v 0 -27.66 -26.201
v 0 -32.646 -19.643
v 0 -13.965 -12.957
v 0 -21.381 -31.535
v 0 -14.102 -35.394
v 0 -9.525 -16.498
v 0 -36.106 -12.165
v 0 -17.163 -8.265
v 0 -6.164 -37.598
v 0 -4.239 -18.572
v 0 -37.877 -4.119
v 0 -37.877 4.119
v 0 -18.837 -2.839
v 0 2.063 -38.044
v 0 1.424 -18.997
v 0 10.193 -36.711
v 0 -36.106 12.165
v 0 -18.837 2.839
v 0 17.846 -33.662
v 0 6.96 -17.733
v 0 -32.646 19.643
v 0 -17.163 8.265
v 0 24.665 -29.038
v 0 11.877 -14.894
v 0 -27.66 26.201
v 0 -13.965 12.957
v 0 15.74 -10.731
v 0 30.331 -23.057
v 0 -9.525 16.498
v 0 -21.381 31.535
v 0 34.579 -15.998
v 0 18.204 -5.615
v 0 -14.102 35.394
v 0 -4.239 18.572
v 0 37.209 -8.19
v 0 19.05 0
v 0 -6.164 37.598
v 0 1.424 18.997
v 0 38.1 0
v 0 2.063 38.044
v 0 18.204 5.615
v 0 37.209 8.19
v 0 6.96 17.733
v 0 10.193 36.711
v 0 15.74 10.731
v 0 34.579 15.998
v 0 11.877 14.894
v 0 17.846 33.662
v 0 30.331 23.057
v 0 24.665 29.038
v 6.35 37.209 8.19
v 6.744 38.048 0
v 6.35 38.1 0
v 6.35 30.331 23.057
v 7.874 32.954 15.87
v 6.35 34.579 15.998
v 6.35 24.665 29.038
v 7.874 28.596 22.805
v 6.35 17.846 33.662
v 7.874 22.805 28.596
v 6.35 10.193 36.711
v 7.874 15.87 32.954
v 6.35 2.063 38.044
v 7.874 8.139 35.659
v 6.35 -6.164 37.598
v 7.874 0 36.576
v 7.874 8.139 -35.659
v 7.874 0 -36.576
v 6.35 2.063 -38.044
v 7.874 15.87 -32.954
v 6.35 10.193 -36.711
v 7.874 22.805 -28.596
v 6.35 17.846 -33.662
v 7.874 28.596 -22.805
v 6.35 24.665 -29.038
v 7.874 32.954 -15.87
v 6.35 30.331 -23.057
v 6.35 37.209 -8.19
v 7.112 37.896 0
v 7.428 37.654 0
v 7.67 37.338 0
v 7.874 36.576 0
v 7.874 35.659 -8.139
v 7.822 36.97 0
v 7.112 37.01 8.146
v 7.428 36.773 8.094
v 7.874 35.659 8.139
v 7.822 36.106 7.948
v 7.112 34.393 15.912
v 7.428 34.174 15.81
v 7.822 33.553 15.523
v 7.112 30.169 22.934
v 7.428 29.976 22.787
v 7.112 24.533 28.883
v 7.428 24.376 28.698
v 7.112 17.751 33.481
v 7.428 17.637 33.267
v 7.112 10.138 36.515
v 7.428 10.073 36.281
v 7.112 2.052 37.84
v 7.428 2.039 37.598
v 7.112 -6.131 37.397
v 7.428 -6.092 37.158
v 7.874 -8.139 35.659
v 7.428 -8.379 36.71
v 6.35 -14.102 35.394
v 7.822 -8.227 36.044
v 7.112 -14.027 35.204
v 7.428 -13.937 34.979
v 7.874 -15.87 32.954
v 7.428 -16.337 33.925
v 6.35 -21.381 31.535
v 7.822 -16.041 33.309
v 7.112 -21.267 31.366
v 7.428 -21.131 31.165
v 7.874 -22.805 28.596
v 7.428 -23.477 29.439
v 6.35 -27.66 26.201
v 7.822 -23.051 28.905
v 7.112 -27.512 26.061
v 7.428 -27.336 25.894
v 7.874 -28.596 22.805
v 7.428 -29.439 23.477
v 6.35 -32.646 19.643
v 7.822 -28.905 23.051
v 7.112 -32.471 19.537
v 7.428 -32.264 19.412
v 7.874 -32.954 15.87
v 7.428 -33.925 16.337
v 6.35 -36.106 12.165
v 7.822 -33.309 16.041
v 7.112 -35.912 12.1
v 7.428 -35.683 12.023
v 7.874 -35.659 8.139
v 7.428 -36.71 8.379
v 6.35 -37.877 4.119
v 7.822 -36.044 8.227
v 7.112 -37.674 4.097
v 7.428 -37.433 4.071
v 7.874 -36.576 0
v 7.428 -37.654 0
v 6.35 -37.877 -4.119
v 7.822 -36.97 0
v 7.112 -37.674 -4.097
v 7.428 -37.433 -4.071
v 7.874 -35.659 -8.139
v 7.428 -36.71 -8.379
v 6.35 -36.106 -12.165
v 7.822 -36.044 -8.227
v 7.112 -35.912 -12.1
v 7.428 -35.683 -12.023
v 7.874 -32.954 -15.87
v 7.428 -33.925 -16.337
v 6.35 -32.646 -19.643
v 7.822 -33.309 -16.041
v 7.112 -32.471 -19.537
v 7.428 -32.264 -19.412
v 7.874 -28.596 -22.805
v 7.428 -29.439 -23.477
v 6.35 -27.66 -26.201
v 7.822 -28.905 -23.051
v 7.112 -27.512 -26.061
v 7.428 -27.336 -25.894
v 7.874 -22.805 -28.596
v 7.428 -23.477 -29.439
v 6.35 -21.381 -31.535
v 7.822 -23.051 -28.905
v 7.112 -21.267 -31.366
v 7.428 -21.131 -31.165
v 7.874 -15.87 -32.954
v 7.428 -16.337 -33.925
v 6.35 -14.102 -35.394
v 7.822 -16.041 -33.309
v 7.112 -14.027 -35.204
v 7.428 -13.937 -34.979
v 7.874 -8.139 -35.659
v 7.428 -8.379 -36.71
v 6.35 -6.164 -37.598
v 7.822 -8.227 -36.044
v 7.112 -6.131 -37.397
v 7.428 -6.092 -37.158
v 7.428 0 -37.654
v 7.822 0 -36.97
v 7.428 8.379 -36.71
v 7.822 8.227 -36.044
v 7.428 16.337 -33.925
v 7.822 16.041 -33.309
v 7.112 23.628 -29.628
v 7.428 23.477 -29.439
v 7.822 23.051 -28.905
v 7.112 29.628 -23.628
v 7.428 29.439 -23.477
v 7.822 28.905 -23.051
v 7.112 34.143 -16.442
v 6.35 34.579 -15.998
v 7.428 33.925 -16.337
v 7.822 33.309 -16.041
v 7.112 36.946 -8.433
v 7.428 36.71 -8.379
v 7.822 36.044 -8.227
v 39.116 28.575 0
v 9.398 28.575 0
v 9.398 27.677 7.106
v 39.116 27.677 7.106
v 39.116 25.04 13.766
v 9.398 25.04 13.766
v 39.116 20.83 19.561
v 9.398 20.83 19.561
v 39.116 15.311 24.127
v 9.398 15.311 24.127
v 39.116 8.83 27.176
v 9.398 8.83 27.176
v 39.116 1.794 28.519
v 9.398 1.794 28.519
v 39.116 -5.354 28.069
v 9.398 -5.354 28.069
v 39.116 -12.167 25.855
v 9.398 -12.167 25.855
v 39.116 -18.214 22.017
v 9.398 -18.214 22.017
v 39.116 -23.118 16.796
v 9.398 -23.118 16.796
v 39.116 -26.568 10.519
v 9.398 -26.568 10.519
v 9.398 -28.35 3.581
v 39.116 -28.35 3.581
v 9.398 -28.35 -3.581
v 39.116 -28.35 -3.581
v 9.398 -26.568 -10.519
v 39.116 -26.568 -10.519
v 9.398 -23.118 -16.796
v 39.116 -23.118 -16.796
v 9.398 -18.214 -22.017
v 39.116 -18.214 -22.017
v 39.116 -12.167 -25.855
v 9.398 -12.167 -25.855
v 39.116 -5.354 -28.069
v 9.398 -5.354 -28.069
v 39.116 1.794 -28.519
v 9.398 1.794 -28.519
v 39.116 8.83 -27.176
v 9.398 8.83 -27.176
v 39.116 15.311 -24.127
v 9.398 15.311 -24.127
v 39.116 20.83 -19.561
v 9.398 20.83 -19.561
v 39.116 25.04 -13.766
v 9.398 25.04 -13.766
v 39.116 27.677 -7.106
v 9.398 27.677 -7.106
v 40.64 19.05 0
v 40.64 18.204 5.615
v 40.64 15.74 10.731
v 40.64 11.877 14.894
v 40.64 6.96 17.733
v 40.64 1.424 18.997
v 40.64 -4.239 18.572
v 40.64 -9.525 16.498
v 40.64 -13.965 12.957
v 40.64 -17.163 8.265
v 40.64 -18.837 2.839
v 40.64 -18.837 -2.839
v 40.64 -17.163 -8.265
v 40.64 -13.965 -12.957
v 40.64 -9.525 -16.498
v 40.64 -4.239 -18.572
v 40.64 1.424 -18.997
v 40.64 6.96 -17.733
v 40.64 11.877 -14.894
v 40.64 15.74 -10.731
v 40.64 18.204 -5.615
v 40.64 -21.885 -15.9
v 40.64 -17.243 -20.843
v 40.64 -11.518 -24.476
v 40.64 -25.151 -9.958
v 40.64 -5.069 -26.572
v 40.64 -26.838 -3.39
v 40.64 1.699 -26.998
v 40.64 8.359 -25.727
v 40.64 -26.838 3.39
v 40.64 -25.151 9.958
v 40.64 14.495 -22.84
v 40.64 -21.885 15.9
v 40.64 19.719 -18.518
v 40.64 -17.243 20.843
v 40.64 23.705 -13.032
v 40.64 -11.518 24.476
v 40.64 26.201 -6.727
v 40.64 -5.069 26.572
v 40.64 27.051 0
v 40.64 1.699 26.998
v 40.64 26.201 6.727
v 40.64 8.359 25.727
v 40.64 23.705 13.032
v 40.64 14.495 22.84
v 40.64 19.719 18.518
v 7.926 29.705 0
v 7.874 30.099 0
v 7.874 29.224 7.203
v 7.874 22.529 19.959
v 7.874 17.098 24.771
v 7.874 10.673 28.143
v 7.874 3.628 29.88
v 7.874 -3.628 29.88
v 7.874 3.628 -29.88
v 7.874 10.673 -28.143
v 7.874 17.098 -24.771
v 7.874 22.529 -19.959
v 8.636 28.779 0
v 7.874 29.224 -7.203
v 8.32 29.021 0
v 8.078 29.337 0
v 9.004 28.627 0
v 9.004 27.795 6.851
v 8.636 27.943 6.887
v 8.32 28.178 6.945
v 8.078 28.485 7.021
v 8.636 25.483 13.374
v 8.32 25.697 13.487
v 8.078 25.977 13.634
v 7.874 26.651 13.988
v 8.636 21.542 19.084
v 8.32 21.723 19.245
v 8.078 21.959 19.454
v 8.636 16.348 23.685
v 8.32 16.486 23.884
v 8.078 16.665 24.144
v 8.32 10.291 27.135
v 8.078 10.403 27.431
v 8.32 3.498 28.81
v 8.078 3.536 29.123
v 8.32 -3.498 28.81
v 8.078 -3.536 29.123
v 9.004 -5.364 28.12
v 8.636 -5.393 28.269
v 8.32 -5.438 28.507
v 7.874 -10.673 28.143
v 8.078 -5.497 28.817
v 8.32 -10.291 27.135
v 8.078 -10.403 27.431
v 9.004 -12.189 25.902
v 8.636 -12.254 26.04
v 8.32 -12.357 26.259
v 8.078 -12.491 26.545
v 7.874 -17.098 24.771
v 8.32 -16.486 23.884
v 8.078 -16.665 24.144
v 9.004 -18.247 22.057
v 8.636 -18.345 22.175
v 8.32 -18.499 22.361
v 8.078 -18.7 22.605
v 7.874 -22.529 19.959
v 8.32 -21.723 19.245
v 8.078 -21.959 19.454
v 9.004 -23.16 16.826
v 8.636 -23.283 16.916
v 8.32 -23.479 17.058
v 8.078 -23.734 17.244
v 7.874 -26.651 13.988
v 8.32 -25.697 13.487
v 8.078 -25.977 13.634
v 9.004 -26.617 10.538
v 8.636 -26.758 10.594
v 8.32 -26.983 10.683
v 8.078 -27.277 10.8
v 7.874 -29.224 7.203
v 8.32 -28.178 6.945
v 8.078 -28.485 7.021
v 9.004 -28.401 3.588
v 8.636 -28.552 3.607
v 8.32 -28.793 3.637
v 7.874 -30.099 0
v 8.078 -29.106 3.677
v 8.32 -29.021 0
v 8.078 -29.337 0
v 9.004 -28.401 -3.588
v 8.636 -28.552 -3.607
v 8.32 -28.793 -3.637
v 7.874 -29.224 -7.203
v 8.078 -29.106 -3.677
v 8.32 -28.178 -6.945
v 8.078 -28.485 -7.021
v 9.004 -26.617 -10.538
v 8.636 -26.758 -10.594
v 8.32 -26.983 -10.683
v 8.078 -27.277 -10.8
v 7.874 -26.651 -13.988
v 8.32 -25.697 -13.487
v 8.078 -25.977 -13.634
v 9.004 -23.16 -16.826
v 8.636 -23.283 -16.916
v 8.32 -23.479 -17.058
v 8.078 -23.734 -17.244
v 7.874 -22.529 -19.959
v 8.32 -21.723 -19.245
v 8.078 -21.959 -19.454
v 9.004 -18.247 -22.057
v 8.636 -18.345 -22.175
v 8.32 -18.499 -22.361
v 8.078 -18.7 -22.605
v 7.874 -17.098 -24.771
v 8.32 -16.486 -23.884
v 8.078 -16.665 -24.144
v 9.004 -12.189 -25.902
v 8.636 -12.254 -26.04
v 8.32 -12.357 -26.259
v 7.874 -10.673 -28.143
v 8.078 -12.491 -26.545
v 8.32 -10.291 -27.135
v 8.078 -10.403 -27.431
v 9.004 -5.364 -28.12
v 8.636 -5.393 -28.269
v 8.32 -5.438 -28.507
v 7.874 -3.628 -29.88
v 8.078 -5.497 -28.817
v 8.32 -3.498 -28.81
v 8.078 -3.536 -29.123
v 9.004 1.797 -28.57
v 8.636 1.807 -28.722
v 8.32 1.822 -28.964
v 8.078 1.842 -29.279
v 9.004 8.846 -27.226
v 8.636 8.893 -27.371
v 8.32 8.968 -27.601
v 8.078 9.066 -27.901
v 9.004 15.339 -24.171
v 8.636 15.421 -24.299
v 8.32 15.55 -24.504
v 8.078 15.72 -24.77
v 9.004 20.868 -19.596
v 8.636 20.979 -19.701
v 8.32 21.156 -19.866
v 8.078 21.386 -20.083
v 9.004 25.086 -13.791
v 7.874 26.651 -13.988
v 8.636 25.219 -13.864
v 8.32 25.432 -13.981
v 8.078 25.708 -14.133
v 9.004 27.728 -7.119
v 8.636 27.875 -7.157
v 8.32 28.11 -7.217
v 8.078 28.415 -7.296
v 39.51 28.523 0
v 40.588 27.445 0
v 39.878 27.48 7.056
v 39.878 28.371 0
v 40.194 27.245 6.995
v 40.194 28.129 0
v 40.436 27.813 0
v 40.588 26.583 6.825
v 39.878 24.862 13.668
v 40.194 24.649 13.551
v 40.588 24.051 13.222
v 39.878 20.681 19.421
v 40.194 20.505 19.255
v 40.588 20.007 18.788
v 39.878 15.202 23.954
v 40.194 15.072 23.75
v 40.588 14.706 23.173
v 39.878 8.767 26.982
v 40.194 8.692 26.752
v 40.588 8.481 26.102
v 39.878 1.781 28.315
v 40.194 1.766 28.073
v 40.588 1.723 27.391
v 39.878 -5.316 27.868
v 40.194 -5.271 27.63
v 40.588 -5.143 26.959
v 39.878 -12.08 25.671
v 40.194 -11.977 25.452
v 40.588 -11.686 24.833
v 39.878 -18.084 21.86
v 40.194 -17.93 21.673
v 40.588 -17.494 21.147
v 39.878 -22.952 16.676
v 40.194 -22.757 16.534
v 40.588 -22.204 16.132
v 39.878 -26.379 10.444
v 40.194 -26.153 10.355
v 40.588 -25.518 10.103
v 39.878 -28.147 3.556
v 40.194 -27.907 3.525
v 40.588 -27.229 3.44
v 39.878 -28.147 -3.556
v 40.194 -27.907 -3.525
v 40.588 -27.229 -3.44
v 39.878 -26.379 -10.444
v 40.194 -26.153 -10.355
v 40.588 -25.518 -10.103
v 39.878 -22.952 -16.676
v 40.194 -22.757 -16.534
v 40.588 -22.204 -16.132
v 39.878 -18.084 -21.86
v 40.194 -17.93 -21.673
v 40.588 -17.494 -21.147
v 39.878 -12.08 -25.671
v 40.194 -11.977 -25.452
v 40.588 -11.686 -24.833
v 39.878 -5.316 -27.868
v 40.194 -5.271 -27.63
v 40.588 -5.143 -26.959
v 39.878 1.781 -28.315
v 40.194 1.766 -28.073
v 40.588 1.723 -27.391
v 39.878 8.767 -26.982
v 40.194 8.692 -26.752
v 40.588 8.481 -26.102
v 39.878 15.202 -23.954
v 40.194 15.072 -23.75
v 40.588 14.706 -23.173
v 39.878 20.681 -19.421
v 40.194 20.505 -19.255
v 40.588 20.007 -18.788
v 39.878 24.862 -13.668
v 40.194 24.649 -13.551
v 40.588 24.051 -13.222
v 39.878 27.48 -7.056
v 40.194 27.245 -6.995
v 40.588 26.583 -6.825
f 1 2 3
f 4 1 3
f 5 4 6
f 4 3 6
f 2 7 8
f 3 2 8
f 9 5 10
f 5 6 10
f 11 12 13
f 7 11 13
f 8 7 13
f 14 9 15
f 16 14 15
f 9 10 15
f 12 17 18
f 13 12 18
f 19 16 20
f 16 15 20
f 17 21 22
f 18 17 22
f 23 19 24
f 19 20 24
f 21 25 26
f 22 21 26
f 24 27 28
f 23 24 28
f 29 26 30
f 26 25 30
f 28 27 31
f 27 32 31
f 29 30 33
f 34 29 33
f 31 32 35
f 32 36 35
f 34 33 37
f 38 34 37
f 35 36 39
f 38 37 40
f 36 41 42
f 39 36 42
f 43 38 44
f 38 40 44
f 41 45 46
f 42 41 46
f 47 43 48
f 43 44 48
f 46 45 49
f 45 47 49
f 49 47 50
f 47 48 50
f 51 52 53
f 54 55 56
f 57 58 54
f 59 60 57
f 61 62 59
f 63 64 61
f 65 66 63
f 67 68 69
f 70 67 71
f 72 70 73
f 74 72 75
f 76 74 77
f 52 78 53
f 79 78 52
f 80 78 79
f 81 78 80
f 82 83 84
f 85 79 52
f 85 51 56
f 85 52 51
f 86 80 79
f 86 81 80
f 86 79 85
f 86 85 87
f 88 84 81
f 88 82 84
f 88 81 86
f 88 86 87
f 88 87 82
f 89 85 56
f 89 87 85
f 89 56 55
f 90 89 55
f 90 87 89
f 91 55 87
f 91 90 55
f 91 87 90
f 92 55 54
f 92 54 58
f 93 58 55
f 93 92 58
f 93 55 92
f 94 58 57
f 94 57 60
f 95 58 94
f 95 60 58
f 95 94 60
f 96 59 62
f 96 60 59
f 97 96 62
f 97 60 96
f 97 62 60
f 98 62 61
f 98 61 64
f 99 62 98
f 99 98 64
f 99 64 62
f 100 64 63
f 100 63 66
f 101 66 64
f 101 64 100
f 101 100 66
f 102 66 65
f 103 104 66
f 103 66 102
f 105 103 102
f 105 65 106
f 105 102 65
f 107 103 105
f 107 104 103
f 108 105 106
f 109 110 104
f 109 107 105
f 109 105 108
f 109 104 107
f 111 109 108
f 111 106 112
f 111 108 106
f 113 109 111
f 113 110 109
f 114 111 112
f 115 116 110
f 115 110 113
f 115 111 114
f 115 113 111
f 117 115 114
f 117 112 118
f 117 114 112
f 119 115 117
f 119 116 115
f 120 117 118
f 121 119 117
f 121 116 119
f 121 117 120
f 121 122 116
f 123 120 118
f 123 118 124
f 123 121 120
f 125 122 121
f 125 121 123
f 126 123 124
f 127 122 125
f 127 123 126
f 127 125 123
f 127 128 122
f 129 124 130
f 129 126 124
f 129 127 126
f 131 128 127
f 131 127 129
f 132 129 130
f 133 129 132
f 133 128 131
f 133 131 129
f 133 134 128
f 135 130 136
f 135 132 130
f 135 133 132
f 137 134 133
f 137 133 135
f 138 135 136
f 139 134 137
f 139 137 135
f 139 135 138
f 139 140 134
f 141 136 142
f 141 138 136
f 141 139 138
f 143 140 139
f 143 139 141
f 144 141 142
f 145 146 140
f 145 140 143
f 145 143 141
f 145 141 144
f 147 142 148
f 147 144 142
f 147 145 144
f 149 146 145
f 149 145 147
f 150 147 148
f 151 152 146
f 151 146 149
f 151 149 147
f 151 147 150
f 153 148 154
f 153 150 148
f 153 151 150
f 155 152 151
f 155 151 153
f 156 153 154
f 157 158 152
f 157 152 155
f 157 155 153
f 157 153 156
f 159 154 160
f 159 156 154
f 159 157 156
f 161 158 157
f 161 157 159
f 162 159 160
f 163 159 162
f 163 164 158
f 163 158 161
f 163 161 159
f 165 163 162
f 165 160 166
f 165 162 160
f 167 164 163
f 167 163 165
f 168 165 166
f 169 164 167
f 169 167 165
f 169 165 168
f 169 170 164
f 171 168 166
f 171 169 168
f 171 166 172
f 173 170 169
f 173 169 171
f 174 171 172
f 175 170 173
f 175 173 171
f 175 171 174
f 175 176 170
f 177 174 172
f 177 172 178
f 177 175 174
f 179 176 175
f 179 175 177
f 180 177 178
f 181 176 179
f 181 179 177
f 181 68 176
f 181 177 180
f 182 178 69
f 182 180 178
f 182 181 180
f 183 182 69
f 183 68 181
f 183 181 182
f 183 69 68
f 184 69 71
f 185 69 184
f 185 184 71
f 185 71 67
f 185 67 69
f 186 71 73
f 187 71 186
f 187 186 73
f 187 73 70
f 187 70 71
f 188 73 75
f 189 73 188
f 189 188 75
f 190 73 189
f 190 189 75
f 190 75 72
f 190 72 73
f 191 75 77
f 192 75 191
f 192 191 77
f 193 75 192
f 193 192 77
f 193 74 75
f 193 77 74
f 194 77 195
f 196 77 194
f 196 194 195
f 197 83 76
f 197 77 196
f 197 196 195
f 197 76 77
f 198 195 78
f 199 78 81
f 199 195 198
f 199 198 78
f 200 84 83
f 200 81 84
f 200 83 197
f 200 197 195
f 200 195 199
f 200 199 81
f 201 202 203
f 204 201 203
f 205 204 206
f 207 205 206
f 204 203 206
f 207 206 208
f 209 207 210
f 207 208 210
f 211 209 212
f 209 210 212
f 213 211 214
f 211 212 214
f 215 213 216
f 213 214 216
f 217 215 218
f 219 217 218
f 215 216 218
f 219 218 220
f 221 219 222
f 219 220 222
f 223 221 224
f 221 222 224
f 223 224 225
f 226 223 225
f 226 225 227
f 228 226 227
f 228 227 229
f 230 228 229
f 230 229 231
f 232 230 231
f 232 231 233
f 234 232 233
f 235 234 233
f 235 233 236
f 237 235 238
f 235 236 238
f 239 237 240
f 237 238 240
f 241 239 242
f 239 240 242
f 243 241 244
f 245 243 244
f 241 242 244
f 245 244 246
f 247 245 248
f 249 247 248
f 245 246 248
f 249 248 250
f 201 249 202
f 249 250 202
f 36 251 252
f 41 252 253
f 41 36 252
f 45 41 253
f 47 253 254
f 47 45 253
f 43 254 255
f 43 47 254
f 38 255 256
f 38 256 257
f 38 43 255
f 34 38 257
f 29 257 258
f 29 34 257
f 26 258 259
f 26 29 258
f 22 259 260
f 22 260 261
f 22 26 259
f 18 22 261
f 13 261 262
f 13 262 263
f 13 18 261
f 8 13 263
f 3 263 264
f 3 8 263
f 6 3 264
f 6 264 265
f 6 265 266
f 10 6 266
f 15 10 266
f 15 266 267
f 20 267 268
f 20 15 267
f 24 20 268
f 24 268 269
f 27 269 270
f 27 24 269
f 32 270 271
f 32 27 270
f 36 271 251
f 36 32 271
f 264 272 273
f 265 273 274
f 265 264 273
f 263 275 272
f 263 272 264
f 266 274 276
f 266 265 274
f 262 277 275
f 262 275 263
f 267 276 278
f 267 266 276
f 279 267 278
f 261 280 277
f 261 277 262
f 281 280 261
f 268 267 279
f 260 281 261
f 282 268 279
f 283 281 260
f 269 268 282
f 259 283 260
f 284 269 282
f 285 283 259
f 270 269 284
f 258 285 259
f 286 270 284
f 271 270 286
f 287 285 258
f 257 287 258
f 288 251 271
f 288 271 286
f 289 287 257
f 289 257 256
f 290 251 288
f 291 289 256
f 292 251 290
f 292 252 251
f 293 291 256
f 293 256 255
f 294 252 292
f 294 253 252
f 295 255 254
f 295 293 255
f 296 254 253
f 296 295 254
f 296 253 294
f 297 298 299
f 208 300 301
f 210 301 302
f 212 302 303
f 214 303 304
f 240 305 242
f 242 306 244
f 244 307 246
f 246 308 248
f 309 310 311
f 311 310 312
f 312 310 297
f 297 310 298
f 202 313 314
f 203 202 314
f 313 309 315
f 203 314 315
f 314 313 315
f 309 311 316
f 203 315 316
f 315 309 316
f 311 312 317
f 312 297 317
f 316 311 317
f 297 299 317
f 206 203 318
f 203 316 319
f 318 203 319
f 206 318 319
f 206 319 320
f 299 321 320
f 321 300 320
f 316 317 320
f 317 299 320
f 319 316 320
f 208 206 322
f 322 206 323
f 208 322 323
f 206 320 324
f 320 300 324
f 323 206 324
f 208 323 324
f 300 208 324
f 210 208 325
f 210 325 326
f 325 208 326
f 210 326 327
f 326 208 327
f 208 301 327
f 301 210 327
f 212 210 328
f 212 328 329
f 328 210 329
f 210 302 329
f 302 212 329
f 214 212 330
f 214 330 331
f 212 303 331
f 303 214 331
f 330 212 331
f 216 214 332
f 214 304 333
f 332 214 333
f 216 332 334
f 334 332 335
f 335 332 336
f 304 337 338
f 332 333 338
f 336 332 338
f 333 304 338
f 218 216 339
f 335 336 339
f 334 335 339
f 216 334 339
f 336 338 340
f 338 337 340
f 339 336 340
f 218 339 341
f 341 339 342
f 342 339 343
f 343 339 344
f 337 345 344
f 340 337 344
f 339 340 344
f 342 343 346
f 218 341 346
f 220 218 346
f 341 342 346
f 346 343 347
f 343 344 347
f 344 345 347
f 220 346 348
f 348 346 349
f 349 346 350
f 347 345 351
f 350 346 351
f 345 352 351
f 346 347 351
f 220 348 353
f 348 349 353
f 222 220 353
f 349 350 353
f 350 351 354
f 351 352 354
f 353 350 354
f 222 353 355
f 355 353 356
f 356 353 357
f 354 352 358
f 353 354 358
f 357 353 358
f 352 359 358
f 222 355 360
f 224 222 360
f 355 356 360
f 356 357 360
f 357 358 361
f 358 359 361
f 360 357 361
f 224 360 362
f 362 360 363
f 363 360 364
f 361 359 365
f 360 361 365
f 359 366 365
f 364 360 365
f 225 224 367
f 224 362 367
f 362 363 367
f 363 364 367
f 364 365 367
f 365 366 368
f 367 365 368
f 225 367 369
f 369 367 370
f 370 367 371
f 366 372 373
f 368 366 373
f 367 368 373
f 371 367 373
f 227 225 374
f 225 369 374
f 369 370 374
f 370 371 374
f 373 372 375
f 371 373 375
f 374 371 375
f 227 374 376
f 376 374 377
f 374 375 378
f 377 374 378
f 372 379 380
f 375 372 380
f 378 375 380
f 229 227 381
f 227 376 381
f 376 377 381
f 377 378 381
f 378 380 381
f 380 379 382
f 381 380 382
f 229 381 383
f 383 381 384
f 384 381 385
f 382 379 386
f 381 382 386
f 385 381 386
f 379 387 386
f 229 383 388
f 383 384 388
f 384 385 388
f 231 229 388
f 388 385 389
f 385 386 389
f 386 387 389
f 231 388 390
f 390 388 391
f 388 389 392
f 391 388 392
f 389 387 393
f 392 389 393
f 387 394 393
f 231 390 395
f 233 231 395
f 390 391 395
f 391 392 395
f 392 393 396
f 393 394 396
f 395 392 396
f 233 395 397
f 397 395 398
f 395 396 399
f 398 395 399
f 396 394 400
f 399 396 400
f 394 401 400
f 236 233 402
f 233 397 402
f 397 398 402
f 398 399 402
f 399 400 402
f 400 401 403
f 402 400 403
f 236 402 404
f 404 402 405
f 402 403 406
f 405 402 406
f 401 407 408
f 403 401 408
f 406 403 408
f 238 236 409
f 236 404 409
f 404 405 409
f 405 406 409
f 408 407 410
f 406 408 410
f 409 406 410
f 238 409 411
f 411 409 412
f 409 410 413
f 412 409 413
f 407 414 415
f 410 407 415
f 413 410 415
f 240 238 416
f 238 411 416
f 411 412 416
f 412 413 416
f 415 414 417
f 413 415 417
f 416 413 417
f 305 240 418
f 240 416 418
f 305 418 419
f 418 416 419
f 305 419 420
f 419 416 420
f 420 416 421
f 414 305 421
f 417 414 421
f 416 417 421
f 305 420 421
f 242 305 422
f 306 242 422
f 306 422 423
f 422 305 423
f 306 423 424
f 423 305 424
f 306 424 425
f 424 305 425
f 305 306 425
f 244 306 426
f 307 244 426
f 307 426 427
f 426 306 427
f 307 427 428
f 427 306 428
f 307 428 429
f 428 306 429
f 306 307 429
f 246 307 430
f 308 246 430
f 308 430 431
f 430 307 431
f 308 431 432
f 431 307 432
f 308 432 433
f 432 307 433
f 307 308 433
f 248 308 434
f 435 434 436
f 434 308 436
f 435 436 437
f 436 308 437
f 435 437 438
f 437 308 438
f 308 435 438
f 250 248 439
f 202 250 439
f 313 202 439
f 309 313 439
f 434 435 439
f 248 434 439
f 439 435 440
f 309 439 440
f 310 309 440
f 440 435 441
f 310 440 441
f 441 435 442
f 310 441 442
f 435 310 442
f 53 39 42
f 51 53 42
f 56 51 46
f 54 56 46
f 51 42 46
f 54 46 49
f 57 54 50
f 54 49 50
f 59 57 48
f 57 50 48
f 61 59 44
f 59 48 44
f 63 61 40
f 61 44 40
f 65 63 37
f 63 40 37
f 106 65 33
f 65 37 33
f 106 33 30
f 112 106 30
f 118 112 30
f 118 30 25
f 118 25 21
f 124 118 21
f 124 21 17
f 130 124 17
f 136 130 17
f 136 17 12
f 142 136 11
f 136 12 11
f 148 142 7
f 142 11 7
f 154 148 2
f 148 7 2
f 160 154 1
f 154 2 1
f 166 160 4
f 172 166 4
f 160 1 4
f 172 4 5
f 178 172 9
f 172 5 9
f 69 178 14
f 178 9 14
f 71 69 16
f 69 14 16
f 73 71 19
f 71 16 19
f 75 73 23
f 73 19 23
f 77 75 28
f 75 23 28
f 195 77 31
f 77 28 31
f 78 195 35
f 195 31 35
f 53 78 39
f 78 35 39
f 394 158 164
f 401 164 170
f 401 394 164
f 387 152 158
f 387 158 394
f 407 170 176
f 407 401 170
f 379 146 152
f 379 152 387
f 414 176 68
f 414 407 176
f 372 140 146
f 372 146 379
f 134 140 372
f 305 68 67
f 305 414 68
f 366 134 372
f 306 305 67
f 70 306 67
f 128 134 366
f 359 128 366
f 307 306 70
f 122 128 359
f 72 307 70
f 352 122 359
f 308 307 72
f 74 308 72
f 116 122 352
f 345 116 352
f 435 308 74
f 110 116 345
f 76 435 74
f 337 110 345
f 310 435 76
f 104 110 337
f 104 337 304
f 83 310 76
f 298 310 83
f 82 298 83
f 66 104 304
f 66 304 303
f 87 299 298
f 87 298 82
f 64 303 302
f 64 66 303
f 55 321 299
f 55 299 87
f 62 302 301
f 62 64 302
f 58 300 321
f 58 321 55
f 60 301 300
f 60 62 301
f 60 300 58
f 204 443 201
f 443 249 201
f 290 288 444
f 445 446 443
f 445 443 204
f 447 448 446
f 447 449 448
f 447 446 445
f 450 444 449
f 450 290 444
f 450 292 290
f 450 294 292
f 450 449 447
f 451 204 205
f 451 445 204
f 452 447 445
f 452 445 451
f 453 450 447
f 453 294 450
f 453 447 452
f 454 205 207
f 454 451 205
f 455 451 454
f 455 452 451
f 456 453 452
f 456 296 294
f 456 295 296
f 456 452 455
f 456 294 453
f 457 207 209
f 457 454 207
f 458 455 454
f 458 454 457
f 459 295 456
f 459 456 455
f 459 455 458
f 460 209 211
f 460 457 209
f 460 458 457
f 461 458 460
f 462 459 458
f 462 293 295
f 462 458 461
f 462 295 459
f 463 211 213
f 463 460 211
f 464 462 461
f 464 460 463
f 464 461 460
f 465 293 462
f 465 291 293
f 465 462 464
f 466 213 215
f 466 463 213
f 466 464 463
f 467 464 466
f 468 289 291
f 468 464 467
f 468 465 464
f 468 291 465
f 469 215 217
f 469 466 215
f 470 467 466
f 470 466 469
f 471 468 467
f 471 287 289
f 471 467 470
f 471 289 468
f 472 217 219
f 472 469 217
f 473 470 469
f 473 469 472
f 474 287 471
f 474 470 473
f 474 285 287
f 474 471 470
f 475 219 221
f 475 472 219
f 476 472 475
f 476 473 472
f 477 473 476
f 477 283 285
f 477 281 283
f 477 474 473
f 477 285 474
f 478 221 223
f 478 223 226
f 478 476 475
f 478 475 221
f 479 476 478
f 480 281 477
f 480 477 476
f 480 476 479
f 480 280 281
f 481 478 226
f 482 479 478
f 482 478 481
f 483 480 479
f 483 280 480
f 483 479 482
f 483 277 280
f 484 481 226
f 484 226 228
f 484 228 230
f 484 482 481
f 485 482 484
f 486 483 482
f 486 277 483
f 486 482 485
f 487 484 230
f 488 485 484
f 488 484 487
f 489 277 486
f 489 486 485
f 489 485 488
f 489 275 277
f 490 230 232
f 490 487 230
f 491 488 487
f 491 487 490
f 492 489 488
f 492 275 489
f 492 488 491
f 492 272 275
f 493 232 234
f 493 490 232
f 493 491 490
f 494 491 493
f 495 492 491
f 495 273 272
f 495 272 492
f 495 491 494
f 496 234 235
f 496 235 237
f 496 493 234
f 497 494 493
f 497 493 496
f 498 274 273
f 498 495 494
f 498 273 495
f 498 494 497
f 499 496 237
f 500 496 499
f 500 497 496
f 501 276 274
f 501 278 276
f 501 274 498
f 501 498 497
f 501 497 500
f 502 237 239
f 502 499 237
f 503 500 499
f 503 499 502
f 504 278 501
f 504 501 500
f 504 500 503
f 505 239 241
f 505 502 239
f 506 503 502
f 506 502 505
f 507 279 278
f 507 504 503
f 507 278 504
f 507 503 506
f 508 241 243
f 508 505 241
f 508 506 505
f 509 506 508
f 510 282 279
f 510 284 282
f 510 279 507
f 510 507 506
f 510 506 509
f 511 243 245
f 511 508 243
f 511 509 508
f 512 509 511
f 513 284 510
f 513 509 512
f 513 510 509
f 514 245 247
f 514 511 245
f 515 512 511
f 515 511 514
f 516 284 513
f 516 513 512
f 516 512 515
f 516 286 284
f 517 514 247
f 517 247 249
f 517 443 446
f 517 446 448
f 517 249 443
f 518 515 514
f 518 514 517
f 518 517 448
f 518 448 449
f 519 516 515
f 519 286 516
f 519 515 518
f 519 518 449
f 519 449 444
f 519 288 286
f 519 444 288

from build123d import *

# Parameters (mm, degrees)
F0_R     = 38.1
F0_R_2   = 19.05
F1_DEPTH = 7.874
F2_R     = 28.575
F2_R_2   = 19.05
F3_DEPTH = 32.766
F4_R     = 1.524


with BuildPart() as f1:
    # F0 (on Right) → F1 (new body)
    with BuildSketch(Plane.YZ):
        Circle(F0_R)
        Circle(F0_R_2, mode=Mode.SUBTRACT)
    extrude(amount=F1_DEPTH)

    # F2 (on face) → F3 (join)
    with BuildSketch(Plane.YZ.offset(7.874)):
        Circle(F2_R)
        Circle(F2_R_2, mode=Mode.SUBTRACT)
    extrude(amount=F3_DEPTH)

    # F4
    f4_edges = [f1.edges().sort_by_distance(p)[0] for p in [
        (7.874, -38.1, 0),
        (7.874, -28.575, 0),
        (40.64, -28.575, 0),
    ]]
    fillet(f4_edges, radius=F4_R)


solid = f1.part
